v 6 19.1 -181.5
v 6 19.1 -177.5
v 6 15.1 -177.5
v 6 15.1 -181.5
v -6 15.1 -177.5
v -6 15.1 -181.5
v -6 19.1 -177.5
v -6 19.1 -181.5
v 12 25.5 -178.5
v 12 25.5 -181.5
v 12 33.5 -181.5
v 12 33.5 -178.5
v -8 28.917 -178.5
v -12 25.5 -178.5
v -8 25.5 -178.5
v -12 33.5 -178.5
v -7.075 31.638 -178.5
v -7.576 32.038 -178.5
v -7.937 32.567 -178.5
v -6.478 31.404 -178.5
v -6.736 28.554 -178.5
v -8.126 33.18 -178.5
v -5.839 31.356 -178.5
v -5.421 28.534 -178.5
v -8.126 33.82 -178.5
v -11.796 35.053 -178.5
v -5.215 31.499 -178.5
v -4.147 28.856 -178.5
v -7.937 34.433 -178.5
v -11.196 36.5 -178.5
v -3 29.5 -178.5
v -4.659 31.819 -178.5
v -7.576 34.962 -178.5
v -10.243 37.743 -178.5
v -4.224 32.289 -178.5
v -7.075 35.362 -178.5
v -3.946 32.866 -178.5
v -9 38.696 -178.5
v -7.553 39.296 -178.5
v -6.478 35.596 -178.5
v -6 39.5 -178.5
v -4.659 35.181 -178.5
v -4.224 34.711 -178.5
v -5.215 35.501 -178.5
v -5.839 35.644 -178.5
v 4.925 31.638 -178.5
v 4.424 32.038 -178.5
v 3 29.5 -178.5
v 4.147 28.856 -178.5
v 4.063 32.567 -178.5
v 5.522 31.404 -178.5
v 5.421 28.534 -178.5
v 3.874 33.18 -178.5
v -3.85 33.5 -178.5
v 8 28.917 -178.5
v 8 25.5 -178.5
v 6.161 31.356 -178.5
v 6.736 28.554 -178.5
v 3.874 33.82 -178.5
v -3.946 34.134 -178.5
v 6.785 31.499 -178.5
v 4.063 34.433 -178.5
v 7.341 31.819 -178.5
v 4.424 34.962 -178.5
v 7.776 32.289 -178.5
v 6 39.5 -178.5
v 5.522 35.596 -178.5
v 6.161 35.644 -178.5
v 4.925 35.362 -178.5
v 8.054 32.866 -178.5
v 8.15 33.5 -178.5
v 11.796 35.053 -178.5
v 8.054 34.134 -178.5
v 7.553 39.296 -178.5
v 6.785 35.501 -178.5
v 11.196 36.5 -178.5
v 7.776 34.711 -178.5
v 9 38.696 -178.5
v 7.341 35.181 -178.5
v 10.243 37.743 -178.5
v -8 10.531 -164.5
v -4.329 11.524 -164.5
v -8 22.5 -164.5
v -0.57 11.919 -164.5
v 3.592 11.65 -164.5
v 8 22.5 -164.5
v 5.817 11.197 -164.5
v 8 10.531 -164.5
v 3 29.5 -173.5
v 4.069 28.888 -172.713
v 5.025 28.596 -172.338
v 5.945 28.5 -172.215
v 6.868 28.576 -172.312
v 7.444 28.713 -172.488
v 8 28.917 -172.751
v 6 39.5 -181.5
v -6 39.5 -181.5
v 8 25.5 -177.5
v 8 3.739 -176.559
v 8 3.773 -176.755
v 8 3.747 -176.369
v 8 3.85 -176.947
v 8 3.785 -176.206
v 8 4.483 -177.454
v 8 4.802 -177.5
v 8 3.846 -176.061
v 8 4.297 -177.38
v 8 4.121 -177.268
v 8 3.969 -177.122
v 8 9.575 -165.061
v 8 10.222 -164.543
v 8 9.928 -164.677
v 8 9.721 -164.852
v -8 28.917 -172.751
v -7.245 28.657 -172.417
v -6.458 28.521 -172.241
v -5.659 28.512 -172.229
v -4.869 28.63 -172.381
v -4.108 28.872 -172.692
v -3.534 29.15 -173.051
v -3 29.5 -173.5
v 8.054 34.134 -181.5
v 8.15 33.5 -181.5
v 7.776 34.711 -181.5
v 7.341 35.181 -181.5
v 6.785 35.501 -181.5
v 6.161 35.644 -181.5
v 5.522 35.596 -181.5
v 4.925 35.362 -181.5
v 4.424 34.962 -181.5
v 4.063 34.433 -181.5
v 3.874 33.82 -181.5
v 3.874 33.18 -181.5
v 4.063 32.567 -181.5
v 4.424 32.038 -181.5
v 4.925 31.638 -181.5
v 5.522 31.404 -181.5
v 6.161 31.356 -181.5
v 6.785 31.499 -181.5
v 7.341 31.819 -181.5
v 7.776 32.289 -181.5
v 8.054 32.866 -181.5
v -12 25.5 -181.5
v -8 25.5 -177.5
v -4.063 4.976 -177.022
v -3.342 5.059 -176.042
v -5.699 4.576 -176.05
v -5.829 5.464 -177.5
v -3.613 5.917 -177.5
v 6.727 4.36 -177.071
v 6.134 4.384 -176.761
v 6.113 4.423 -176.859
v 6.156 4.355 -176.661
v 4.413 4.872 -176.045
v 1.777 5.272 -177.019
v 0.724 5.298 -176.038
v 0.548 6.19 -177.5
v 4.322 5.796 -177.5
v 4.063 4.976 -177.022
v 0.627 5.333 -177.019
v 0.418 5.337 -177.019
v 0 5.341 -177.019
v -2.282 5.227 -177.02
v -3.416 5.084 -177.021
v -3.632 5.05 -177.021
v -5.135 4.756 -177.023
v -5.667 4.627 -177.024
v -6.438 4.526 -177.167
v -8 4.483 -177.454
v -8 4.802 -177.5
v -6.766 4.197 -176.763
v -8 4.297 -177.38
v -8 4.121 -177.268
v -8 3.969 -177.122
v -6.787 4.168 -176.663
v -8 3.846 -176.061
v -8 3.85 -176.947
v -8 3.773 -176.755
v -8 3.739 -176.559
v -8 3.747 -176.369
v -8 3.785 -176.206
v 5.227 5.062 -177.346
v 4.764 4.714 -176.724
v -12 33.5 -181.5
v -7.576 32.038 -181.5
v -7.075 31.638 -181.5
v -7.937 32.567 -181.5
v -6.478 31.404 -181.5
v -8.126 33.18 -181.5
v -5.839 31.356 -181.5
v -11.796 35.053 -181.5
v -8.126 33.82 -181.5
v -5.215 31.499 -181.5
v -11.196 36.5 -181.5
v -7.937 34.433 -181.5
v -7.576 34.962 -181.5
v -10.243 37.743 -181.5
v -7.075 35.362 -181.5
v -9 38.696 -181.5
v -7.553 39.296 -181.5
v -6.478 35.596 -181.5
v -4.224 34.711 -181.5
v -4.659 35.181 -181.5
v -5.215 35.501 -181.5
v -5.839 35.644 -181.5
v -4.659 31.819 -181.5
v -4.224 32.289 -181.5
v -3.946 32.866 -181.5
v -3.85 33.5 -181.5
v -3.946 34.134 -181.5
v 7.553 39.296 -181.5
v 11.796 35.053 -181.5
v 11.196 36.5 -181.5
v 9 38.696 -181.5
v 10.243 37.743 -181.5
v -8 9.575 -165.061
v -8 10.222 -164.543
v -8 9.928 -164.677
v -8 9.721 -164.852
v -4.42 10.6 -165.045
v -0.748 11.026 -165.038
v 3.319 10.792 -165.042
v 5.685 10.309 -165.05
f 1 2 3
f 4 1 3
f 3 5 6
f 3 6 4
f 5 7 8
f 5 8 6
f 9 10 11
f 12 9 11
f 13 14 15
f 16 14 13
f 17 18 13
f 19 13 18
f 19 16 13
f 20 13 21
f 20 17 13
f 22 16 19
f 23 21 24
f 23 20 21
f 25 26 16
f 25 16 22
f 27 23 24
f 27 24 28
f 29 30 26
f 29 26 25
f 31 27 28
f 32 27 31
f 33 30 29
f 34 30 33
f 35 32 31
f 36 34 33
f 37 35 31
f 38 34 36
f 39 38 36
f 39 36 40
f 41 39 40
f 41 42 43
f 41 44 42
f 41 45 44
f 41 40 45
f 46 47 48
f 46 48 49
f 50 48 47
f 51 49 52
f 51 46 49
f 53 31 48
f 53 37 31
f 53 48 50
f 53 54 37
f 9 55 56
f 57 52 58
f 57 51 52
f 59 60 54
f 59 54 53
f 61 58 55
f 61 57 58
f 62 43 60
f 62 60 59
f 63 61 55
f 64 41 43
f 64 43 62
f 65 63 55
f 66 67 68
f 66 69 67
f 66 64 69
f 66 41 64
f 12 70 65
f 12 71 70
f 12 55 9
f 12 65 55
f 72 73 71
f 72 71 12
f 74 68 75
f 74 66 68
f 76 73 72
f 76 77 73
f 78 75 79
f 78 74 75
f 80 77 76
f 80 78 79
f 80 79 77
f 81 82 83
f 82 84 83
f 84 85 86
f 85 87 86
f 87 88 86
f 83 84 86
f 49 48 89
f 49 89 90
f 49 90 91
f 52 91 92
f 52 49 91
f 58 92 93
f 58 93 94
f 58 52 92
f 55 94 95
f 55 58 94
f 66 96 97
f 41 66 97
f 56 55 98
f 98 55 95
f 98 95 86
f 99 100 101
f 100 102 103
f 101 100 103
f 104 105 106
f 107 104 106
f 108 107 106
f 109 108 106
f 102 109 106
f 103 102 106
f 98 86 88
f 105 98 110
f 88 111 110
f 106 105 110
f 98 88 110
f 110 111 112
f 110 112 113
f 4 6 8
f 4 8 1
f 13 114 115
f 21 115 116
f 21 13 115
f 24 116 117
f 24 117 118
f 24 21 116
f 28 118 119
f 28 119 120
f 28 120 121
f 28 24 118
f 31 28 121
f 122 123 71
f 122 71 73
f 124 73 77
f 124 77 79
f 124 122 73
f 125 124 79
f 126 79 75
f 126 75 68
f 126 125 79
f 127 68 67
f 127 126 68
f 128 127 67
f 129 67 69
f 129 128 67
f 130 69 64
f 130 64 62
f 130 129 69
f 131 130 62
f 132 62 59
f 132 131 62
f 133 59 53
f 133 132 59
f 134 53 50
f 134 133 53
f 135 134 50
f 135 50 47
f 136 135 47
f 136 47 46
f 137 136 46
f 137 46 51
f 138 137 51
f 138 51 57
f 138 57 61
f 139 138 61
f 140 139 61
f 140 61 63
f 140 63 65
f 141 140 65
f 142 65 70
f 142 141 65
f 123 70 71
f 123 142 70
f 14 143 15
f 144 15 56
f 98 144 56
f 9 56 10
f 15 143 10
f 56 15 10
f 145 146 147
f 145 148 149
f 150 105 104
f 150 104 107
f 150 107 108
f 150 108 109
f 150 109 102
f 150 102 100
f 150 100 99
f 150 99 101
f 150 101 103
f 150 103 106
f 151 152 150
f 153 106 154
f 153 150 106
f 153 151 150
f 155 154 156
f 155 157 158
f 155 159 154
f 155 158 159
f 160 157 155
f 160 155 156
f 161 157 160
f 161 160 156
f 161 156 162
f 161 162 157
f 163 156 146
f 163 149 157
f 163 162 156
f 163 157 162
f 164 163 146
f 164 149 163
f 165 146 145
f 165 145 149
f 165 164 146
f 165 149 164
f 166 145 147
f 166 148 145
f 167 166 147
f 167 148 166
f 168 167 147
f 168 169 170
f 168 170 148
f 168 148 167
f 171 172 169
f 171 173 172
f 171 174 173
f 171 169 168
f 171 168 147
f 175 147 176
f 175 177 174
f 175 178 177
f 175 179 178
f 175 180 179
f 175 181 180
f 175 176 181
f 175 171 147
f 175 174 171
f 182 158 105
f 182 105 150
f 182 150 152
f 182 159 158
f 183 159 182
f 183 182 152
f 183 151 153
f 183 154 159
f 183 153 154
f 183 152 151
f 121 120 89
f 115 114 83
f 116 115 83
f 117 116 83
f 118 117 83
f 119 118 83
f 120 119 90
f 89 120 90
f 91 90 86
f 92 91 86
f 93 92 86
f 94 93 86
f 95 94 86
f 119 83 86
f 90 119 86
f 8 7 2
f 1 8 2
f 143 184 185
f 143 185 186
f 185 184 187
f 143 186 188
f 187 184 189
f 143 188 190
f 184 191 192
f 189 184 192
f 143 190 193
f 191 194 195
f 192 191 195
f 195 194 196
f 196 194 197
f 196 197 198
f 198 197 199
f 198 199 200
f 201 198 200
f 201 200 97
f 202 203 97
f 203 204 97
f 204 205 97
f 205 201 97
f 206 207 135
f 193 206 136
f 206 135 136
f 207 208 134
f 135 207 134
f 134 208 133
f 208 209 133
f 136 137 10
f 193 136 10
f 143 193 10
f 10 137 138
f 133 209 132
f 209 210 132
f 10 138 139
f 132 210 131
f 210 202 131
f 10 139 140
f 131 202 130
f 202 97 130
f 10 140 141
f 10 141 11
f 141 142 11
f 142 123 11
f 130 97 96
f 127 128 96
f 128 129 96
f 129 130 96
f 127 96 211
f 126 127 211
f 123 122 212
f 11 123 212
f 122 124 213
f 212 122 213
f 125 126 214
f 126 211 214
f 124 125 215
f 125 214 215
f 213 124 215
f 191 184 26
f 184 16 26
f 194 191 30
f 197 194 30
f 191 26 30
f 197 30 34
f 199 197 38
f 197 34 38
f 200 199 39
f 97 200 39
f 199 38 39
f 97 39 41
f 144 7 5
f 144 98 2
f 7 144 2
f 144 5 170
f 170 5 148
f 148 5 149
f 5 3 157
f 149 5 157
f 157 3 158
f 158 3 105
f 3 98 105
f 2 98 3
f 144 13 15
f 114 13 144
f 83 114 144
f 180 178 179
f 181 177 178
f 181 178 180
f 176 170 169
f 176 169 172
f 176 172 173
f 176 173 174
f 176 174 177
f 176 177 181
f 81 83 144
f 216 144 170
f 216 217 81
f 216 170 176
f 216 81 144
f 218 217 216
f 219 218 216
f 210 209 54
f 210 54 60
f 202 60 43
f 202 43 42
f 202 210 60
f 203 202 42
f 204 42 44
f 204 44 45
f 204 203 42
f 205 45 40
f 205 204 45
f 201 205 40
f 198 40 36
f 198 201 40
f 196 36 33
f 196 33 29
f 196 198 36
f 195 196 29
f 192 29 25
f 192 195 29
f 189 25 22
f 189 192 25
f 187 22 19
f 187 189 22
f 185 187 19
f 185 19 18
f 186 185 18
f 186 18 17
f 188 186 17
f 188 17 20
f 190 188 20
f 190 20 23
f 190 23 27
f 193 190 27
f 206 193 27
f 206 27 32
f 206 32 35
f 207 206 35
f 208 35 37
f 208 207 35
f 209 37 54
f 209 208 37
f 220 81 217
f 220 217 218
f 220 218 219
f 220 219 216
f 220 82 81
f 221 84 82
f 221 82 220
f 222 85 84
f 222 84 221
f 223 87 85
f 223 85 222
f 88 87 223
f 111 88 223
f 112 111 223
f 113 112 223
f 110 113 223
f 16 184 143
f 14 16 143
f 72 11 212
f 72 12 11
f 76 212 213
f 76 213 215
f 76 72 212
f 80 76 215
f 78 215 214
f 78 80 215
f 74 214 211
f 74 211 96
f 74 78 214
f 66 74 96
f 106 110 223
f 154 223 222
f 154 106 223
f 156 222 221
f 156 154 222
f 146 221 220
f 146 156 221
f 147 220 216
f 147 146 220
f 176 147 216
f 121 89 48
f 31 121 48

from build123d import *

# Parameters (mm, degrees)
SKETCH133_R          = 2.15
PAD070_DEPTH         = 3
PAD071_DEPTH         = 8
SKETCH135_R          = 25.5
POCKET019_DEPTH      = 17.388212
POCKET019_DEPTH_BACK = 14.320967
CHAMFER011_SIZE2     = 7
CHAMFER011_SIZE      = 9
SKETCH136_R          = 5
POCKET020_DEPTH      = 14.001
FILLET011_R          = 6
FILLET012_R          = 1
SKETCH137_W          = 12
SKETCH137_H          = 4
PAD072_DEPTH         = 4


with BuildPart() as part:
    # Sketch133 → Pad070 (new body)
    with BuildSketch(Plane.XY):
        Polygon((12, -6), (12, 6), (-12, 6), (-12, -6), (-12, -8), (12, -8), align=None)
        with Locations((6, 0)):
            Circle(SKETCH133_R, mode=Mode.SUBTRACT)
        with Locations((-6, 0)):
            Circle(SKETCH133_R, mode=Mode.SUBTRACT)
    extrude(amount=PAD070_DEPTH)

    # Sketch134 → Pad071 (join, symmetric)
    with BuildSketch(Plane.YZ):
        Polygon((-4, 3), (-8, 3), (-8, 4), (-30, 4), (-30, 7.4), (-25, 17), (-4, 17), align=None)
    extrude(amount=PAD071_DEPTH, both=True)

    # Sketch135 (on DatumPlane) → Pocket019 (cut, two sides)
    with BuildSketch(Plane(origin=(8, -25, 17), x_dir=(-1, 0, 0), z_dir=(0, 0.461934, 0.886914))) as pocket019_sk:
        with Locations((8, 23)):
            Circle(SKETCH135_R)
    extrude(amount=-POCKET019_DEPTH, mode=Mode.SUBTRACT)
    extrude(pocket019_sk.sketch, amount=POCKET019_DEPTH_BACK, mode=Mode.SUBTRACT)

    # Chamfer011
    chamfer011_edges = [part.edges().sort_by_distance(p)[0] for p in [
        (0, -4, 17),
    ]]
    chamfer011_side = part.faces().sort_by_distance((0, -4, 10))[0]
    chamfer(chamfer011_edges, length=CHAMFER011_SIZE, length2=CHAMFER011_SIZE2, reference=chamfer011_side)

    # Sketch136 (on Face7 of Chamfer011) → Pocket020 (cut, through all)
    with BuildSketch(Plane.XY.offset(3)):
        with Locations((-6, 0)):
            Circle(SKETCH136_R)
        with Locations((6, 0)):
            Circle(SKETCH136_R)
    extrude(amount=POCKET020_DEPTH, mode=Mode.SUBTRACT)

    # Fillet011
    fillet011_edges = [part.edges().sort_by_distance(p)[0] for p in [
        (-12, 6, 1.5),
        (12, 6, 1.5),
    ]]
    fillet(fillet011_edges, radius=FILLET011_R)

    # Fillet012
    fillet012_edges = [part.edges().sort_by_distance(p)[0] for p in [
        (0, -22.181238, 17),
        (0, -28.952071, 4),
    ]]
    fillet(fillet012_edges, radius=FILLET012_R)

    # Sketch137 (on Face2 of Fillet012) → Pad072 (join)
    with BuildSketch(Plane(origin=(0, 0, 4), x_dir=(1, 0, 0), z_dir=(0, 0, -1))):
        with Locations((0, 16.4)):
            Rectangle(SKETCH137_W, SKETCH137_H)
    extrude(amount=PAD072_DEPTH)


with BuildPart() as part_1:
    # Body031 placement: moved
    add(part.part.moved(Location((0, 33.5, -181.5))))


solid = part_1.part
